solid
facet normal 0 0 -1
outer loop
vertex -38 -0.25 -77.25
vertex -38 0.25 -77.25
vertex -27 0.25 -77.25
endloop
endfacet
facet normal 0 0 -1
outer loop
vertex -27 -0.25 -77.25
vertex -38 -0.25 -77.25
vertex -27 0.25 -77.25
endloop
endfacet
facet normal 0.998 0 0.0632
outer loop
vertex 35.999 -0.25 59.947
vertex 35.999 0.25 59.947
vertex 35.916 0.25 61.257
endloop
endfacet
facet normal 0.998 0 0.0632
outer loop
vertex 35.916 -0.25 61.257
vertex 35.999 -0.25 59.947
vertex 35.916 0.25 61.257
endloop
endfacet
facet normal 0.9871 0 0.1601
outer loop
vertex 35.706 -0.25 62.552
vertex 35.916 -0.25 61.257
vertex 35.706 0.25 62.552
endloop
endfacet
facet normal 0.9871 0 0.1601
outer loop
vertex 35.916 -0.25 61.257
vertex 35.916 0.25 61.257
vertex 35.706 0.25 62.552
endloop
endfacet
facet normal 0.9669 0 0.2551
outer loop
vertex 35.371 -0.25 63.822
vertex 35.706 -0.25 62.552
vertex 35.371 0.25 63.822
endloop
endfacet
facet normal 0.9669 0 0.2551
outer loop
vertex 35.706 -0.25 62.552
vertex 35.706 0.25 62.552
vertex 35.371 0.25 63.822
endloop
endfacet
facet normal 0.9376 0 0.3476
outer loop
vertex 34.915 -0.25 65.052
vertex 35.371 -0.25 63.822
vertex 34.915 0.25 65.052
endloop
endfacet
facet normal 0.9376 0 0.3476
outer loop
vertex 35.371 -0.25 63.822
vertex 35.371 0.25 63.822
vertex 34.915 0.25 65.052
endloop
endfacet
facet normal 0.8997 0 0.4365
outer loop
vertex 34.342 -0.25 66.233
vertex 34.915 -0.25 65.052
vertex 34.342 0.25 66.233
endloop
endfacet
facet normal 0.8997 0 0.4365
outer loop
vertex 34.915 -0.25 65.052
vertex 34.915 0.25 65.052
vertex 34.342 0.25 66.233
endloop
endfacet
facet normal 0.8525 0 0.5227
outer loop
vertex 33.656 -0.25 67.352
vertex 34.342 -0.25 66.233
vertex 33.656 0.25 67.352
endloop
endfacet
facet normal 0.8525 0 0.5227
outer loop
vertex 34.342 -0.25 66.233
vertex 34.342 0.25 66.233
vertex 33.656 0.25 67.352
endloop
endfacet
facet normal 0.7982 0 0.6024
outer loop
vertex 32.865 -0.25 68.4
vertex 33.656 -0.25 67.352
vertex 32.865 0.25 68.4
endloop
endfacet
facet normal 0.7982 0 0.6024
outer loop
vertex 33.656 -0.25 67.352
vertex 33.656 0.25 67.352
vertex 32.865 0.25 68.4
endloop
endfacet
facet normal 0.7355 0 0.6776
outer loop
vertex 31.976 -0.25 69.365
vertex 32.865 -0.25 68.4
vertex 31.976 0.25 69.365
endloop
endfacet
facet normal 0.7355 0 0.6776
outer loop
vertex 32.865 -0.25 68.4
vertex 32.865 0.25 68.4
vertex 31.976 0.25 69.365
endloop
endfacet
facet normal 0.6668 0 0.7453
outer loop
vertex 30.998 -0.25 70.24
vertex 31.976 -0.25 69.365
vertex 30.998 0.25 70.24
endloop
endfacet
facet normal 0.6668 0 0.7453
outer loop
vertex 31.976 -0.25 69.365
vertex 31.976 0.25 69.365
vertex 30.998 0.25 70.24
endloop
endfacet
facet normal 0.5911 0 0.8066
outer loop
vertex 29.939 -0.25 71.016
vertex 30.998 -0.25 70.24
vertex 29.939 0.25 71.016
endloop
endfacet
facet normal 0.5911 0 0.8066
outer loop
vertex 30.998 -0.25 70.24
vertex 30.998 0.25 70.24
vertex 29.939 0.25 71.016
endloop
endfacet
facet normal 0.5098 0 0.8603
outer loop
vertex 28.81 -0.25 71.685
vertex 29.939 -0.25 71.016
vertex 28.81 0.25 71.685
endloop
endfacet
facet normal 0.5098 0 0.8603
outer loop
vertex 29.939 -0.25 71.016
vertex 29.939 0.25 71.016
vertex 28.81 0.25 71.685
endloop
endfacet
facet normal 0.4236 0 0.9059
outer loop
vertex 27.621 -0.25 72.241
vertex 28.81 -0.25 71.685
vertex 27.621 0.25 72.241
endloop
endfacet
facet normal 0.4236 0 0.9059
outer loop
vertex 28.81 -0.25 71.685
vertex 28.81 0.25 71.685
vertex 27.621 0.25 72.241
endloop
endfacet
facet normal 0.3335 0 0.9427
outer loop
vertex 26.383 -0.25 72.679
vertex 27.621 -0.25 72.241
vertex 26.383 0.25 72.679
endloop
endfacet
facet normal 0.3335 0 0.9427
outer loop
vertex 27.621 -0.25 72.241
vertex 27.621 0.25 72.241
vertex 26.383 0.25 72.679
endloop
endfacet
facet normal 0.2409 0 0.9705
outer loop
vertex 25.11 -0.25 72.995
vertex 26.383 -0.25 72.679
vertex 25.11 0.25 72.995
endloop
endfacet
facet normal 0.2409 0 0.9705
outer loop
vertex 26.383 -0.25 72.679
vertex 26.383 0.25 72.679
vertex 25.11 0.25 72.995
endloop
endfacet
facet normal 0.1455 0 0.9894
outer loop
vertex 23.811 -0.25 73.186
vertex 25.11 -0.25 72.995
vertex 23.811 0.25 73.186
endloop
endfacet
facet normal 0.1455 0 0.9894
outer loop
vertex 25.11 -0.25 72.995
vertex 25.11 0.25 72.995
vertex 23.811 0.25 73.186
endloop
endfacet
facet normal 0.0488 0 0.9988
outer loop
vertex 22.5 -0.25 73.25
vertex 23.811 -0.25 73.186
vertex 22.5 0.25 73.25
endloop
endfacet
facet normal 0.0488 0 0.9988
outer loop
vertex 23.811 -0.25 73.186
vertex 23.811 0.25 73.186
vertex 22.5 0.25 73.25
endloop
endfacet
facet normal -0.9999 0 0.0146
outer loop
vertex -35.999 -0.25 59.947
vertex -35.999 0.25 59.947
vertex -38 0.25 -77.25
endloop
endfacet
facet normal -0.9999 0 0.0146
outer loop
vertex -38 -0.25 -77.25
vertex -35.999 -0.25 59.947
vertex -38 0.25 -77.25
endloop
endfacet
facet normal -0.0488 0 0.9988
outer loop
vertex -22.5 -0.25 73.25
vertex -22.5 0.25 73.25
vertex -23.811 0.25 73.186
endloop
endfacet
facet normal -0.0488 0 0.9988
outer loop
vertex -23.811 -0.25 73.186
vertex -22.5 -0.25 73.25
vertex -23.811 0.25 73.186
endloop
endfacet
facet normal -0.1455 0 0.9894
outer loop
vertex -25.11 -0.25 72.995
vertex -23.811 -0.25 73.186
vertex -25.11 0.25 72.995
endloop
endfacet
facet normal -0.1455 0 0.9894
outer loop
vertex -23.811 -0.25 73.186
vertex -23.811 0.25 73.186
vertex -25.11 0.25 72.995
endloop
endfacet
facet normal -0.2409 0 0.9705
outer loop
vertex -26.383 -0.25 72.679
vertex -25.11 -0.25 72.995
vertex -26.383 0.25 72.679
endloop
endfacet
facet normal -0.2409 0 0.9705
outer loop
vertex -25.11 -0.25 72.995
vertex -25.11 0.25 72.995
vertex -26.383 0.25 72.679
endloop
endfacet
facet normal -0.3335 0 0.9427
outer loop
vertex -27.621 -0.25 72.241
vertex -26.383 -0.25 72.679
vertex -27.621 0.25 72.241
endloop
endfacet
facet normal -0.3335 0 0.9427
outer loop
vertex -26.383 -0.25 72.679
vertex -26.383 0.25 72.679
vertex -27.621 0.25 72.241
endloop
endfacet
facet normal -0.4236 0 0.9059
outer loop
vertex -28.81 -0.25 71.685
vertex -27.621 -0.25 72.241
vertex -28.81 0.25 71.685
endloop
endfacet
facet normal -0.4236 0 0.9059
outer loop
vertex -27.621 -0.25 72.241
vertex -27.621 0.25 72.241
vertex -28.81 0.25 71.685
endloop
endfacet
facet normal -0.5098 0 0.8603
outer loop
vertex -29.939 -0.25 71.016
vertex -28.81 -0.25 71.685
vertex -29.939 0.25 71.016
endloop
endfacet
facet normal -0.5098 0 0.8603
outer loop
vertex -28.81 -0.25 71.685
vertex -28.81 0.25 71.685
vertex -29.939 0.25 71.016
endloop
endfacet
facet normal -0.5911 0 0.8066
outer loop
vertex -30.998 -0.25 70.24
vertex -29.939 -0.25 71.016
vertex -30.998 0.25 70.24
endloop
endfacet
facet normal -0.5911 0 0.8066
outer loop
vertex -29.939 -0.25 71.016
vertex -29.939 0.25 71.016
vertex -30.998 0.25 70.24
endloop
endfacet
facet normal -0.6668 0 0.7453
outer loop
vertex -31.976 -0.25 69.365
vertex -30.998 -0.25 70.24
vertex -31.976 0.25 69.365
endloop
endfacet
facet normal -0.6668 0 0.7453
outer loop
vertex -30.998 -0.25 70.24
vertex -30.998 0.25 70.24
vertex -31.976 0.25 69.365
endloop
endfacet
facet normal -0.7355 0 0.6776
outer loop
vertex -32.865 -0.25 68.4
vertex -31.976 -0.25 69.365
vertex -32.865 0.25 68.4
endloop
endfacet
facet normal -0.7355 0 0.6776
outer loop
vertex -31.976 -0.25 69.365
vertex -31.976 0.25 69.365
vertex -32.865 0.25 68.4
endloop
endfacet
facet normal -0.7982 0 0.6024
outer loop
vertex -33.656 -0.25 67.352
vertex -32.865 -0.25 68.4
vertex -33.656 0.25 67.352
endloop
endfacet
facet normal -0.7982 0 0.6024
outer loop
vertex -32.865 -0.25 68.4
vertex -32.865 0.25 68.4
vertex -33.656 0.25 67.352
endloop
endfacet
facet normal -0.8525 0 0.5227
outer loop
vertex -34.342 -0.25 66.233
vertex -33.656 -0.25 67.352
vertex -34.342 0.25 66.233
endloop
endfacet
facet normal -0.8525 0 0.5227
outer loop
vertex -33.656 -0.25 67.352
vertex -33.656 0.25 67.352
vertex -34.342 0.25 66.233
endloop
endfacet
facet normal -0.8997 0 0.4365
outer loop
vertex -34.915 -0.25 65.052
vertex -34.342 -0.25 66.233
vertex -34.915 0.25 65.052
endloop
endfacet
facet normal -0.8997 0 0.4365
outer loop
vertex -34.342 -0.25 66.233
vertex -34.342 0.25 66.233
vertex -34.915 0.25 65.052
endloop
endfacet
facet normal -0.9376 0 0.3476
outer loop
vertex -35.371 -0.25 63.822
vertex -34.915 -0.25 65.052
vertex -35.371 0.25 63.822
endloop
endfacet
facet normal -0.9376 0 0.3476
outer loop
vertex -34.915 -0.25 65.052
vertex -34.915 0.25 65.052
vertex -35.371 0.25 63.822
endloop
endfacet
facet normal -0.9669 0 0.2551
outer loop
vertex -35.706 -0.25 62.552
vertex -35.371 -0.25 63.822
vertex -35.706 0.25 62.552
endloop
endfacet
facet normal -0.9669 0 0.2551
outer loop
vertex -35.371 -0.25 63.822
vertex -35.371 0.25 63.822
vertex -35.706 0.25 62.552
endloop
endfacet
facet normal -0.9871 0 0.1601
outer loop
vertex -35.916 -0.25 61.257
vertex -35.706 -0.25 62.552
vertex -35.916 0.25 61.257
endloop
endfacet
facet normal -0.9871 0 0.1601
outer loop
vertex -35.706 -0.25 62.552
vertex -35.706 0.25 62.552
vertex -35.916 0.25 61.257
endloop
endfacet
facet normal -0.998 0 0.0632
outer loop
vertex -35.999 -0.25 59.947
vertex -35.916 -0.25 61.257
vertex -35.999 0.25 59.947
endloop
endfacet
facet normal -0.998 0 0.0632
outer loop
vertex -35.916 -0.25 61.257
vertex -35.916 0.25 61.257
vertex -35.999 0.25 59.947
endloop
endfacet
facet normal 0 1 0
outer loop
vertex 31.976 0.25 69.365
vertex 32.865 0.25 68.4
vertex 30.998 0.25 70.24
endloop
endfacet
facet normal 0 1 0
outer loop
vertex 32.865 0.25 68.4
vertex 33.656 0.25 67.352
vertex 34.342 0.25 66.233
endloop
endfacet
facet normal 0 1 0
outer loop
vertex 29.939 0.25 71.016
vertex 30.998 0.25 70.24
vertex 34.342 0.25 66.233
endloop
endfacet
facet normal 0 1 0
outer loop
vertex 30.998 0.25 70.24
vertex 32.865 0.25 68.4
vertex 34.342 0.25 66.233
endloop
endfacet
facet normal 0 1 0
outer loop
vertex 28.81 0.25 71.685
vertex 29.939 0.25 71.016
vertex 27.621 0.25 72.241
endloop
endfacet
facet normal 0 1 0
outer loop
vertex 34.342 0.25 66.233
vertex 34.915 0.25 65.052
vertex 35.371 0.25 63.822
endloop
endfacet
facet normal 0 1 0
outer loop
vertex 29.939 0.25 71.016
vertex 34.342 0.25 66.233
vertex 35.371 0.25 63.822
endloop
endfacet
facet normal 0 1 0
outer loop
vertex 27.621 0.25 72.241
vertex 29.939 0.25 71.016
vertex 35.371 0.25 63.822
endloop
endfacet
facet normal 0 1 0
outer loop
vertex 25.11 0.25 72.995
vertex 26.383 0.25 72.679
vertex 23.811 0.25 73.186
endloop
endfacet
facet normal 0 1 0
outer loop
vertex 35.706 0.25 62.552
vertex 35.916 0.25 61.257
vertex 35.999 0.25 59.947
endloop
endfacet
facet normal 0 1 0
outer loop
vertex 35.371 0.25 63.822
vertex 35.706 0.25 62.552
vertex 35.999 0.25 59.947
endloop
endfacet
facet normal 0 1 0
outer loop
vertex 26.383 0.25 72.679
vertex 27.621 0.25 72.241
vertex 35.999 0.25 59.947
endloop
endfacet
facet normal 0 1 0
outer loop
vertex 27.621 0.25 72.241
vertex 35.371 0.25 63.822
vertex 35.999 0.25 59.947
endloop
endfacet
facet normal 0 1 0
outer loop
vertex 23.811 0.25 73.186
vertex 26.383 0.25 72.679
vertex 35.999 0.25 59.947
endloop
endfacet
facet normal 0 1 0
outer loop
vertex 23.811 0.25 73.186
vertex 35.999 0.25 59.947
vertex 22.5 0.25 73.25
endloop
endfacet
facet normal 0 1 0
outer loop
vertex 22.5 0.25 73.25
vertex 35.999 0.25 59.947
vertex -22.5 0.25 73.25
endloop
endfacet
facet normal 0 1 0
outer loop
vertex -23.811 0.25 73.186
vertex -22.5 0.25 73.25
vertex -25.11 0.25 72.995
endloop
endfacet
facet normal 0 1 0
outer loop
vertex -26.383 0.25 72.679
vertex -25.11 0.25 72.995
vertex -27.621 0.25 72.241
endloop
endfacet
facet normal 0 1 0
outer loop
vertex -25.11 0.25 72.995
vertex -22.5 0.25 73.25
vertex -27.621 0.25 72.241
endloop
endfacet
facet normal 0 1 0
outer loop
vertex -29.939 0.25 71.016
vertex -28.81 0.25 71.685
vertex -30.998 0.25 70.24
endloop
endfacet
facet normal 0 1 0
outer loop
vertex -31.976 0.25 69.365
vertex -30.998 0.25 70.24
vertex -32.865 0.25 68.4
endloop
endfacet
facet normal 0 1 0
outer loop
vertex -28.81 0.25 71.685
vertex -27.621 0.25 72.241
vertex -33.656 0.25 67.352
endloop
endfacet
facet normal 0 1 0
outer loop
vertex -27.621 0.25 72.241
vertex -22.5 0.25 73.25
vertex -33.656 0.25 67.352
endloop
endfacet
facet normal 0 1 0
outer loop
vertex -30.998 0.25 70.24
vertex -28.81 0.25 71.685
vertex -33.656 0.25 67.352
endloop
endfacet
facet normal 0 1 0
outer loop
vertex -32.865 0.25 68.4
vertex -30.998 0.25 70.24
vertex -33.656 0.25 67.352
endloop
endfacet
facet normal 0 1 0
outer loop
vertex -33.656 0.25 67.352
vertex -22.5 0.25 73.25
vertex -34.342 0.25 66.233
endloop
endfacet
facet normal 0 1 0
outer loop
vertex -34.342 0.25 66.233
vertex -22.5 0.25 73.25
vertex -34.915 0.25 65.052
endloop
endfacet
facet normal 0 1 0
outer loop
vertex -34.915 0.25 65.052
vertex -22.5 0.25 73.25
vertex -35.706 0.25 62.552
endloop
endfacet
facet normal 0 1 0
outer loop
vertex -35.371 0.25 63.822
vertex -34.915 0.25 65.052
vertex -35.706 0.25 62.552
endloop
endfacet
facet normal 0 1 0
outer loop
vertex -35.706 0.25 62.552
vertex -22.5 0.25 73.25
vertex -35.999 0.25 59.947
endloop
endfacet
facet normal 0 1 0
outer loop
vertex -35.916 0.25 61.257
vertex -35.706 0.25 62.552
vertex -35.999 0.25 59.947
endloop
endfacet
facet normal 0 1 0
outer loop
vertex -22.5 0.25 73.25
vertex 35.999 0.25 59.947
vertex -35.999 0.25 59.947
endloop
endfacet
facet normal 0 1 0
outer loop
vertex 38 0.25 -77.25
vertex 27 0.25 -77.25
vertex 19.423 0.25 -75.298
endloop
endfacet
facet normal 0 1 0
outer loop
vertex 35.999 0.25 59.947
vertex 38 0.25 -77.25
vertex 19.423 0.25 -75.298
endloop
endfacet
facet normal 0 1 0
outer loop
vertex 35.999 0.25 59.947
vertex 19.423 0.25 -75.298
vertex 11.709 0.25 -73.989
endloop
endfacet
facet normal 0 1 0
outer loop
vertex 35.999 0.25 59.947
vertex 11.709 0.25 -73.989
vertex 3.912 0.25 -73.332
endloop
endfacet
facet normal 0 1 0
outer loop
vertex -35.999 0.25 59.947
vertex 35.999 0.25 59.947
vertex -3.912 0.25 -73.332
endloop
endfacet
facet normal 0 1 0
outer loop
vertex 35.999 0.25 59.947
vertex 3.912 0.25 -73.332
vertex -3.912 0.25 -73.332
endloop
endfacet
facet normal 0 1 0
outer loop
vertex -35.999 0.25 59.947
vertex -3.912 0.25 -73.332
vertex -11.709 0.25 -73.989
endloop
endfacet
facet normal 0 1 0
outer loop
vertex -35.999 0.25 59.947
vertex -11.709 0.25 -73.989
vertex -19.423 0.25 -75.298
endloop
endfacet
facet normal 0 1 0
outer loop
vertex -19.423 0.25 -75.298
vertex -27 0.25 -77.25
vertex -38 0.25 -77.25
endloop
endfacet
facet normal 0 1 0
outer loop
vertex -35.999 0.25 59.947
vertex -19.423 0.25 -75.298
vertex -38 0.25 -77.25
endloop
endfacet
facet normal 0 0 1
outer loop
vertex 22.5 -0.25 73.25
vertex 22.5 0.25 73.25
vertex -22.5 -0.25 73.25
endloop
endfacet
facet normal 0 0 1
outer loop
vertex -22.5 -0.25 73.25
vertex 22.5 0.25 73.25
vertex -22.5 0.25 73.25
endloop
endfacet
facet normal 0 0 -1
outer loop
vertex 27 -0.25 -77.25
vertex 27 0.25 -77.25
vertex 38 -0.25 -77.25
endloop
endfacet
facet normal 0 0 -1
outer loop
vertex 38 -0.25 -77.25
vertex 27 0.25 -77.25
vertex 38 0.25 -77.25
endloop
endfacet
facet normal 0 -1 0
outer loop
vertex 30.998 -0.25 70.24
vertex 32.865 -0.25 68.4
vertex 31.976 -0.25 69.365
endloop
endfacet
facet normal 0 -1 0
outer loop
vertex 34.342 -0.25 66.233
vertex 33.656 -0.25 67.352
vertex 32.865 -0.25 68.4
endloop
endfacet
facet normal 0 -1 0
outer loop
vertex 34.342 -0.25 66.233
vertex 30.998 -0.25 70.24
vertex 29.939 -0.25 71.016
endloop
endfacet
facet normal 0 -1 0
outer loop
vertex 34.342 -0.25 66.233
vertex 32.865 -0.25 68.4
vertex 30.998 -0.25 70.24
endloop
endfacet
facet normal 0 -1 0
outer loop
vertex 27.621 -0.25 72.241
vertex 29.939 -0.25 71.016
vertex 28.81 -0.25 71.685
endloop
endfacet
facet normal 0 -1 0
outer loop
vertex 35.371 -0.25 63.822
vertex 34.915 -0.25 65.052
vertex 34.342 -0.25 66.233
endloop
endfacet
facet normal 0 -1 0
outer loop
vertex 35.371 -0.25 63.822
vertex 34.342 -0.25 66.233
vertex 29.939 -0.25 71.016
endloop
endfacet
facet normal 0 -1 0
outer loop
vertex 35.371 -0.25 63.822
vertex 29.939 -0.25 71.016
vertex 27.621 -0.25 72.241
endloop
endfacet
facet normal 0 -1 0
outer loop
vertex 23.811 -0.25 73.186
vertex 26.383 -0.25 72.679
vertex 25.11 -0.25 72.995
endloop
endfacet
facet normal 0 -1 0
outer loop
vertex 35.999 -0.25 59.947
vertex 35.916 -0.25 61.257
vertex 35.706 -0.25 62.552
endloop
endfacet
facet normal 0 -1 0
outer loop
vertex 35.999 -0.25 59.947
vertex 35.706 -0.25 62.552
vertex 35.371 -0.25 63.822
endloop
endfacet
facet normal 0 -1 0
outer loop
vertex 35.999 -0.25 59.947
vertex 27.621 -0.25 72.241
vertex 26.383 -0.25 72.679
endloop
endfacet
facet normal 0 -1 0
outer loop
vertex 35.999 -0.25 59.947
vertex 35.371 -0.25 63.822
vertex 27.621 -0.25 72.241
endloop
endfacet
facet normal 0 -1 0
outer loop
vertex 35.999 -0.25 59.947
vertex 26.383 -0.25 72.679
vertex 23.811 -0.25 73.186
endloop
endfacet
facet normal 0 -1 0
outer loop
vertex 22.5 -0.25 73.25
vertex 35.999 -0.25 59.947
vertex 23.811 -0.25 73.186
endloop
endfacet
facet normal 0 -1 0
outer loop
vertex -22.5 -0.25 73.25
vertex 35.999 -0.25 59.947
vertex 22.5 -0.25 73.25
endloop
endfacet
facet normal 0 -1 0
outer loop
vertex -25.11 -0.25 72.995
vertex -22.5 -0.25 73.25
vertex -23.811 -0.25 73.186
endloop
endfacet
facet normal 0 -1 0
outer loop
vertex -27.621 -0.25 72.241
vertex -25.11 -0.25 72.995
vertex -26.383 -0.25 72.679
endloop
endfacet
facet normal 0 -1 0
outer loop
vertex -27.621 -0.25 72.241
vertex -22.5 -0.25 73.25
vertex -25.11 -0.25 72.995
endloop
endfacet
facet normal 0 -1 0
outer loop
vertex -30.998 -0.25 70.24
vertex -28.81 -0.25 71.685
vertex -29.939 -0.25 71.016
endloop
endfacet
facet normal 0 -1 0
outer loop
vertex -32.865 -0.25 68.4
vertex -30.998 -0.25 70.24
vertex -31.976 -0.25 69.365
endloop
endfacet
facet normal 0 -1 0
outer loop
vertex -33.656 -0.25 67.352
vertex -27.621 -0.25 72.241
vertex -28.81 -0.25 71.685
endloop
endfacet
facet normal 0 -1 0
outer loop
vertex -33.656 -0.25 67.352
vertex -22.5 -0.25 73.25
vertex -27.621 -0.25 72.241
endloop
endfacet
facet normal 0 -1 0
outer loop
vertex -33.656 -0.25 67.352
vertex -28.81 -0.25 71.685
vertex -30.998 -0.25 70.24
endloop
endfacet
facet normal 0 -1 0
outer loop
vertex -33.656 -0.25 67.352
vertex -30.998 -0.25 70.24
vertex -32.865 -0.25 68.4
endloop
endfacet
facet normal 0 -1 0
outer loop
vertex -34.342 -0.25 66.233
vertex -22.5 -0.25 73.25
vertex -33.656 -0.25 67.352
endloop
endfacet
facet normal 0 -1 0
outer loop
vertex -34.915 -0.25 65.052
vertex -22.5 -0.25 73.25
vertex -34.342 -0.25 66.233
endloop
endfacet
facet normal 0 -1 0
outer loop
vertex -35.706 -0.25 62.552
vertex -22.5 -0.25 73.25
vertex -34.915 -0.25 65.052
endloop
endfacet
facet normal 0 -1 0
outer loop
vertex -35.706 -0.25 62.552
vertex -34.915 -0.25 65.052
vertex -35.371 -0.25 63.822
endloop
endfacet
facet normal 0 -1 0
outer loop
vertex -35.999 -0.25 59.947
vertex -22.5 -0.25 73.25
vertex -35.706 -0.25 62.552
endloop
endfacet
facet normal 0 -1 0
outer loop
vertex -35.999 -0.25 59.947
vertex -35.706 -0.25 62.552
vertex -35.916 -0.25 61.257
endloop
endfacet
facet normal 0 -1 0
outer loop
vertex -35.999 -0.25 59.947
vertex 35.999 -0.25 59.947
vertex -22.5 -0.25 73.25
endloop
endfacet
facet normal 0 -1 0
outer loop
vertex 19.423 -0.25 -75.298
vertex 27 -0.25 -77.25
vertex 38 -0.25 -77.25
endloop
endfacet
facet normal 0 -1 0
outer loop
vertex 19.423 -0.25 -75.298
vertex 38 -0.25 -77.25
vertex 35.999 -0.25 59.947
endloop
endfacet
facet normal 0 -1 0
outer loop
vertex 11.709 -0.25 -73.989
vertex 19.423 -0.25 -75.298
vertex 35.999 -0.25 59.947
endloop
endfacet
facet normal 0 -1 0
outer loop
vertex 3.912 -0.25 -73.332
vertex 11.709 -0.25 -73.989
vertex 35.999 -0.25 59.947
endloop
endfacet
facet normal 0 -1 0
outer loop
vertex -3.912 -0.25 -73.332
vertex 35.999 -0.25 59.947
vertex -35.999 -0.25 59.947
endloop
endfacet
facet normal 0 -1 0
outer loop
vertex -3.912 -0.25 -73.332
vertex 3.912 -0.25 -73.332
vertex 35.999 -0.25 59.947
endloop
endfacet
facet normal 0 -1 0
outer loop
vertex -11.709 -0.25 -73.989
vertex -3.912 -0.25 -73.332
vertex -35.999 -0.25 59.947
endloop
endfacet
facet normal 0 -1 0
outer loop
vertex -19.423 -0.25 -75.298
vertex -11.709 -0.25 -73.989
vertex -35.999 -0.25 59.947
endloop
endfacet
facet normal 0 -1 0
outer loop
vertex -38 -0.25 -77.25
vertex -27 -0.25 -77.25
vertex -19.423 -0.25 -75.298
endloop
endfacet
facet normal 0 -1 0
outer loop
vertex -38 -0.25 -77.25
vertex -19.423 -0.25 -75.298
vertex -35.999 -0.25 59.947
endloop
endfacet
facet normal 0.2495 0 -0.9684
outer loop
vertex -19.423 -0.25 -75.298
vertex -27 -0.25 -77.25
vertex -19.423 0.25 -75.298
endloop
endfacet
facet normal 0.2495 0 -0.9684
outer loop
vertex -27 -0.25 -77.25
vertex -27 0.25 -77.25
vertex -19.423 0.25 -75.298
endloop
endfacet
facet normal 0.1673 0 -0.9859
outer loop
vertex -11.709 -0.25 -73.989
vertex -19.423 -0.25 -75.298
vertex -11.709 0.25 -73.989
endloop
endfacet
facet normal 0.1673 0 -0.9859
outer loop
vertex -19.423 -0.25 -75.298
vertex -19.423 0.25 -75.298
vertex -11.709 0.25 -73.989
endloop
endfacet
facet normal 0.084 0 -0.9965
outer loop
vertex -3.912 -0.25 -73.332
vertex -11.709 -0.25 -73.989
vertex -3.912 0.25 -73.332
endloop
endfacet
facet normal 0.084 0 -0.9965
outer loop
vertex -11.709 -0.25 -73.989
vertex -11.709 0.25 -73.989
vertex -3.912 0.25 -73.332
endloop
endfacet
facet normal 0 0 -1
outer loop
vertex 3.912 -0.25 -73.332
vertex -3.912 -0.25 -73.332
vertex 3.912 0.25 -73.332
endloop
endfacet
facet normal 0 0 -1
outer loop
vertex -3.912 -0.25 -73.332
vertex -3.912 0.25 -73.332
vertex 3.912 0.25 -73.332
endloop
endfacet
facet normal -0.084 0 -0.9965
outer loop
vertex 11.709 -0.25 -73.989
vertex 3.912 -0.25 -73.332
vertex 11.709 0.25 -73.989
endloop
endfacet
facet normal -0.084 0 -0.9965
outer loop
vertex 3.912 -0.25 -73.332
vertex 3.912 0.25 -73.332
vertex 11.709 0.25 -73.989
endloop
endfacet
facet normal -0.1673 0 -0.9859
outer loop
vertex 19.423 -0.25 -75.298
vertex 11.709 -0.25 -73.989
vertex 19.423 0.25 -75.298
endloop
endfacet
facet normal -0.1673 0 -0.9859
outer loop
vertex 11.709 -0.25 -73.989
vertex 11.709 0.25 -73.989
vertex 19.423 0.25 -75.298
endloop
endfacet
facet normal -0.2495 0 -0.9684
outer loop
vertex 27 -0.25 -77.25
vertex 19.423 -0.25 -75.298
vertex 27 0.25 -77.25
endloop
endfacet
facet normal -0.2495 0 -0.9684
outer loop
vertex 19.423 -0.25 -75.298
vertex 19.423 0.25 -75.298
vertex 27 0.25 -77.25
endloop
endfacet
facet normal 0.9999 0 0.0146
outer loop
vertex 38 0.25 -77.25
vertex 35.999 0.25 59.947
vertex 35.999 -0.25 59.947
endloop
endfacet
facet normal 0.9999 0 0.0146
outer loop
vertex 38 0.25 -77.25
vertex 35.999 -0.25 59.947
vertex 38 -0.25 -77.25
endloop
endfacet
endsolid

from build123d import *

# Parameters (mm, degrees)
AUFSATZ_LINEAR_AUSTRAGEN1_DEPTH = 0.25
AUFSATZ_LINEAR_AUSTRAGEN2_DEPTH = 0.5


with BuildPart() as part:
    # Skizze1 → Aufsatz-Linear austragen1 (new body, symmetric)
    with BuildSketch(Plane(origin=(0, 0, 0), x_dir=(1, 0, 0), z_dir=(0, 1, 0))):
        with BuildLine():
            Line((-36, 77.25), (-27, 77.25))
            ThreePointArc((-27, 77.25), (0, 73.25), (27, 77.25))
            Line((27, 77.25), (36, 77.25))
            Line((36, 77.25), (36, -59.75))
            ThreePointArc((36, -59.75), (32.045941546, -69.295941546), (22.5, -73.25))
            Line((22.5, -73.25), (-22.5, -73.25))
            ThreePointArc((-22.5, -73.25), (-32.045941546, -69.295941546), (-36, -59.75))
            Line((-36, -59.75), (-36, 77.25))
        make_face()
    extrude(amount=AUFSATZ_LINEAR_AUSTRAGEN1_DEPTH, both=True)

    # Skizze2 → Aufsatz-Linear austragen2 (add)
    with BuildSketch(Plane(origin=(0, 0.25, 0), x_dir=(1, 0, 0), z_dir=(0, 1, 0))):
        with BuildLine():
            Line((-35.998563753, -59.946917797), (-38, 77.25))
            Line((-38, 77.25), (-36, 77.25))
            Line((-36, 77.25), (-36, -59.75))
            ThreePointArc((-36, -59.75), (-35.999640933, -59.848461517), (-35.998563753, -59.946917797))
        make_face()
        with BuildLine():
            Line((36, 77.25), (36, -59.75))
            ThreePointArc((36, -59.75), (35.999640933, -59.848461517), (35.998563753, -59.946917797))
            Line((35.998563753, -59.946917797), (38, 77.25))
            Line((38, 77.25), (36, 77.25))
        make_face()
    extrude(amount=-AUFSATZ_LINEAR_AUSTRAGEN2_DEPTH)


solid = part.part
